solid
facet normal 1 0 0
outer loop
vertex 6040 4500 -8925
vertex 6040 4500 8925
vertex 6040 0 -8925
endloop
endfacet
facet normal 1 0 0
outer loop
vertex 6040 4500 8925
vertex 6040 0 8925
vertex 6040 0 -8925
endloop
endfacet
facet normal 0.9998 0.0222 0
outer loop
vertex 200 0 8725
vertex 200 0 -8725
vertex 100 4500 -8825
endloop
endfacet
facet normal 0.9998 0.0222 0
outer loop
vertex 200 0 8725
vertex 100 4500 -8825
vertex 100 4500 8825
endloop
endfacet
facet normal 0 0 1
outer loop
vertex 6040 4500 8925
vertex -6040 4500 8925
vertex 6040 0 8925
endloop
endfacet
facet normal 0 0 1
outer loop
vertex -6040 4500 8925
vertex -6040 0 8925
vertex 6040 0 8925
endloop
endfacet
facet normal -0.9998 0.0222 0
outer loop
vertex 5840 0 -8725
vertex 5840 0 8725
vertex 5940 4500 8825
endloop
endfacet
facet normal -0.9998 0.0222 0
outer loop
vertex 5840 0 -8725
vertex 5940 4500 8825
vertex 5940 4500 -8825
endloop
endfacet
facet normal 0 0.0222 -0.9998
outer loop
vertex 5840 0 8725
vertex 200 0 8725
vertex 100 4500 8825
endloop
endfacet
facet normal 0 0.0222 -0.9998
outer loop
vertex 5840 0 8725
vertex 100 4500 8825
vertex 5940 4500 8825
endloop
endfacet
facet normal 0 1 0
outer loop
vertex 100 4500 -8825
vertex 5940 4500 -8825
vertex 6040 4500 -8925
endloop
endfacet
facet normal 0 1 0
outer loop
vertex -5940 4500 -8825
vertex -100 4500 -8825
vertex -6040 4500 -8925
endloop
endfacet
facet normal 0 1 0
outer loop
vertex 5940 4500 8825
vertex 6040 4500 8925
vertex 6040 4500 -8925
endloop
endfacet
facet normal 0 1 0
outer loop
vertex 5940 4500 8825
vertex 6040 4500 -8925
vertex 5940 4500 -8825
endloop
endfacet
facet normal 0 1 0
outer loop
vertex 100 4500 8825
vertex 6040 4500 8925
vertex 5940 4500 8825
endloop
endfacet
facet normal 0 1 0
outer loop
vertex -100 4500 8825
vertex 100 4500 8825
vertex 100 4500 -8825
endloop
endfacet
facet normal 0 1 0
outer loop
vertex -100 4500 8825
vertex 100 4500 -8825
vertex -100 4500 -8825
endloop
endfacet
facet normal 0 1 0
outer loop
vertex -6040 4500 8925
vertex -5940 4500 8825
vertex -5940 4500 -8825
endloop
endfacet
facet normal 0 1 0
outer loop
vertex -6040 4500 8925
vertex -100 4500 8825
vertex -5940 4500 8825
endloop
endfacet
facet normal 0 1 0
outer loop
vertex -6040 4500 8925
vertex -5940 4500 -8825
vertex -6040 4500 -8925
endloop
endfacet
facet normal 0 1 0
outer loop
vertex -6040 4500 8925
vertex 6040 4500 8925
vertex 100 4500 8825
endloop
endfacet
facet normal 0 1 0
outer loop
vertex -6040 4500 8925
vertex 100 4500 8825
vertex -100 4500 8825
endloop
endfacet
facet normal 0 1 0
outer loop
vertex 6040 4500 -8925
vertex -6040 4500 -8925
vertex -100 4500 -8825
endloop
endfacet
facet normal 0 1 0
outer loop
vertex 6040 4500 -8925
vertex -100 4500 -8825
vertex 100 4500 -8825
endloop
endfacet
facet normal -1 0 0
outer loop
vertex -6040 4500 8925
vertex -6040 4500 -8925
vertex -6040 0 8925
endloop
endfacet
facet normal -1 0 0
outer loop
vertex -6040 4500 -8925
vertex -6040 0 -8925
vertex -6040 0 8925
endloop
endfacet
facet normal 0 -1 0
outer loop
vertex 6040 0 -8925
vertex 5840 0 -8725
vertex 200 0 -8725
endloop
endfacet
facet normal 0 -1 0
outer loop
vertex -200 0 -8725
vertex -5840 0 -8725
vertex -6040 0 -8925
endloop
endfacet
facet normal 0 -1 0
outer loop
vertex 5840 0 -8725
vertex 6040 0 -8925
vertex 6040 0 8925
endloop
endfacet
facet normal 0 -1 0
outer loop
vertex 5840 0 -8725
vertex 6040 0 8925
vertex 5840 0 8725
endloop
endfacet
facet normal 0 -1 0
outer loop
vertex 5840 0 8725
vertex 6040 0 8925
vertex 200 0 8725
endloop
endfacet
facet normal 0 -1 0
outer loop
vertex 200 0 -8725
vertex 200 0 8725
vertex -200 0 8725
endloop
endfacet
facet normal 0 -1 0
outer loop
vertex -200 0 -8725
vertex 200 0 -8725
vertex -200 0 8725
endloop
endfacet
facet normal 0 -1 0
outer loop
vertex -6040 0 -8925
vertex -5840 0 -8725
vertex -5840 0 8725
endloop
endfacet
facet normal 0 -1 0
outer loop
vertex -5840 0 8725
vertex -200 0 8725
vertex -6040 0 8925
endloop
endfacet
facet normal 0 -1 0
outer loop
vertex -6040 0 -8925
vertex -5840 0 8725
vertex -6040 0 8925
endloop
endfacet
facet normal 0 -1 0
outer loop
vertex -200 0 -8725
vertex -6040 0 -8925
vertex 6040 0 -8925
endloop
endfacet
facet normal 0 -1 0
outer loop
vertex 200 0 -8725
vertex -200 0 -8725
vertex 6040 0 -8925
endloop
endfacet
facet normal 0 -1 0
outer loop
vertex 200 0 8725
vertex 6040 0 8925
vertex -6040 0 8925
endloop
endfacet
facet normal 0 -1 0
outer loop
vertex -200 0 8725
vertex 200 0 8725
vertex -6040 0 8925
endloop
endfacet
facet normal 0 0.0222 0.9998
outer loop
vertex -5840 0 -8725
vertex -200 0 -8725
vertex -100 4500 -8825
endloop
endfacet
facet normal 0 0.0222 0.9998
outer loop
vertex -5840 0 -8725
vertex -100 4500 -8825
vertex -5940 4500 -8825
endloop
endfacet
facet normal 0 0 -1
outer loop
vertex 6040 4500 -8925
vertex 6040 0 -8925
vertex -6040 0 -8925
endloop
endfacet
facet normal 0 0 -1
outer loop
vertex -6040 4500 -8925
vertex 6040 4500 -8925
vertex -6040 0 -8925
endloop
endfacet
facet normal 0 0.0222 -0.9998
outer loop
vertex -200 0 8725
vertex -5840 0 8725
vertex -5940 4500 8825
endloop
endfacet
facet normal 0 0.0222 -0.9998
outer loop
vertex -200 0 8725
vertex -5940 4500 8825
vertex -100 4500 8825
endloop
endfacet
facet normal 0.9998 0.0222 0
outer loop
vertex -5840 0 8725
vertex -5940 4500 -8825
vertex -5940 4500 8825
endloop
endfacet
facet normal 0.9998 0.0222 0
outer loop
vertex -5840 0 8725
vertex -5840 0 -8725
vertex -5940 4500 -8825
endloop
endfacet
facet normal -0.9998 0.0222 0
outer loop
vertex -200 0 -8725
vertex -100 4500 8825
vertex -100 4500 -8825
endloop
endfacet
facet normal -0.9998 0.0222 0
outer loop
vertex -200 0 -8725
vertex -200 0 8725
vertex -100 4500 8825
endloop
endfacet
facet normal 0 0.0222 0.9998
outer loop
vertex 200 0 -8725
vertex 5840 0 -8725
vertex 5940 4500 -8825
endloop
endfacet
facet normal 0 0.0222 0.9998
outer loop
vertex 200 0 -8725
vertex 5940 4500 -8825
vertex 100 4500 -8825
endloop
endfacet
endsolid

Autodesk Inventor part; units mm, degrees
ref_plane "YZ Plane" through (0, 0, 0) normal (1, 0, 0) x (0, 1, 0)
ref_plane "XZ Plane" through (0, 0, 0) normal (0, 1, 0) x (-1, 0, 0)
ref_plane "XY Plane" through (0, 0, 0) normal (0, 0, 1) x (1, 0, 0)
sketch "Эскиз1" plane through (0, 0, 0) normal (0, 1, 0) x (-1, 0, 0)
  line L0 (6040, 8925) -> (-6040, 8925)
  line L1 (-6040, 8925) -> (-6040, -8925)
  line L2 (-6040, -8925) -> (6040, -8925)
  line L3 (6040, -8925) -> (6040, 8925)
  line L4 (-6040, 8925) -> (6040, -8925) construction
  line L5 (-5840, 8725) -> (-5840, -8725)
  line L6 (5840, -8725) -> (5840, 8725)
  line L7 (200, 8725) -> (200, -8725)
  line L8 (-200, 8725) -> (-200, -8725)
  line L9 (5840, 8725) -> (200, 8725)
  line L10 (-200, 8725) -> (-5840, 8725)
  line L11 (-5840, -8725) -> (-200, -8725)
  line L12 (200, -8725) -> (5840, -8725)
  point P0 (0, 0)
  point P1 (0, 0)
  dimension "d0" = 12080
  dimension "d1" = 17850
  dimension "d5" = 200
  dimension "d6" = 400
  dimension "d7" = 200
  dimension "d16" = 200
  dimension "d17" = 200
  dimension "d18" = 200
extrude "Выдавливание4" add sketch "Эскиз1" along normal blind 4500
sketch "Эскиз3" plane through (0, 4500, 0) normal (0, 1, 0) x (1, 0, 0)
  line L0 (6040, -8925) -> (6040, 8925) projected
  line L1 (6040, 8925) -> (-6040, 8925) projected
  line L2 (-6040, 8925) -> (-6040, -8925) projected
  line L3 (-6040, -8925) -> (6040, -8925) projected
  line L4 (200, -8725) -> (200, 8725) projected
  line L5 (200, 8725) -> (5840, 8725) projected
  line L6 (5840, 8725) -> (5840, -8725) projected
  line L7 (5840, -8725) -> (200, -8725) projected
  line L8 (-5840, 8725) -> (-200, 8725) projected
  line L9 (-200, 8725) -> (-200, -8725) projected
  line L10 (-200, -8725) -> (-5840, -8725) projected
  line L11 (-5840, -8725) -> (-5840, 8725) projected
  line L12 (-5940, 8825) -> (-100, 8825)
  line L13 (-100, 8825) -> (-100, -8825)
  line L14 (-100, -8825) -> (-5940, -8825)
  line L15 (-5940, -8825) -> (-5940, 8825)
  line L16 (100, 8825) -> (100, -8825)
  line L17 (100, -8825) -> (5940, -8825)
  line L18 (5940, -8825) -> (5940, 8825)
  line L19 (5940, 8825) -> (100, 8825)
  point P0 (0, 0)
  dimension "d25" = 100
  dimension "d26" = 100
loft "Лофт1" cut profiles "Эскиз3", "Эскиз1" contours L4 L5 L6 L7 | L19 L18 L17 L16 / L10 L8 L11 L5
loft "Лофт2" cut profiles "Эскиз3", "Эскиз1" contours L8 L9 L10 L11 | L12 L13 L14 L15 / L12 L7 L9 L6
sketch "Эскиз4" plane through (5840, 0, -8725) normal (-0.9998, 0.0222, 0) x (0, 0, 1)
  line L0 (17650, 4.4433) -> (-200, 4.4433) projected
  line L1 (-200, 4.4433) -> (-200, 4503.3326) projected
  line L2 (17650, 4503.3326) -> (-200, 4503.3326) projected
  line L3 (17650, 4.4433) -> (17650, 4503.3326) projected
  line L4 (-200, 1504.4433) -> (17650, 1504.4433)
  line L5 (-200, 3004.4433) -> (17650, 3004.4433)
  line L6 (2771.67, 3004.4433) -> (2771.67, 1504.4433)
  line L7 (1285.835, 1504.4433) -> (1285.835, 4.4433)
  line L8 (5743.34, 3004.4433) -> (5743.34, 1504.4433)
  line L9 (8715.01, 3004.4433) -> (8715.01, 1504.4433)
  line L10 (11686.68, 3004.4433) -> (11686.68, 1504.4433)
  line L11 (14658.35, 3004.4433) -> (14658.35, 1504.4433)
  line L12 (4257.505, 1504.4433) -> (4257.505, 4.4433)
  line L13 (7229.175, 1504.4433) -> (7229.175, 4.4433)
  line L14 (10200.845, 1504.4433) -> (10200.845, 4.4433)
  line L15 (13172.515, 1504.4433) -> (13172.515, 4.4433)
  line L16 (16144.185, 1504.4433) -> (16144.185, 4.4433)
  line L17 (1285.835, 3004.4433) -> (1285.835, 4503.3326)
  line L18 (17650, 4503.3326) -> (-200, 4503.3326) projected
  line L19 (4257.505, 3004.4433) -> (4257.505, 4503.3326)
  line L20 (7229.175, 3004.4433) -> (7229.175, 4503.3326)
  line L21 (10200.845, 3004.4433) -> (10200.845, 4503.3326)
  line L22 (13172.515, 3004.4433) -> (13172.515, 4503.3326)
  line L23 (16144.185, 3004.4433) -> (16144.185, 4503.3326)
  point P0 (8725, -129.7457)
  dimension "d38" = 1500
  dimension "d40" = 1500
  dimension "d41" = 2971.67
  dimension "d42" = 1485.835
  dimension "d45" = 2971.67
  dimension "d52" = 2971.67
  dimension "d59" = 2971.67
sketch "Эскиз5" plane through (200, 0, -8725) normal (0, 0.0222, 0.9998) x (1, 0, 0)
  line L0 (5840, 4.4433) -> (-6240, 4.4433) projected
  line L1 (-6240, 4.4433) -> (-6240, 4503.3326) projected
  line L2 (5840, 4503.3326) -> (-6240, 4503.3326) projected
  line L3 (5840, 4.4433) -> (5840, 4503.3326) projected
  line L4 (-6240, 1504.4433) -> (5840, 1504.4433)
  line L5 (-6240, 3004.4433) -> (5840, 3004.4433)
  line L6 (3826.65, 1504.4433) -> (3826.65, 4.4433)
  line L7 (5168.88, 3004.4433) -> (5168.88, 1504.4433)
  line L8 (3826.65, 3004.4433) -> (3826.65, 4503.3326)
  line L9 (1142.21, 1504.4433) -> (1142.21, 4.4433)
  line L10 (-1542.23, 1504.4433) -> (-1542.23, 4.4433)
  line L11 (-4226.67, 1504.4433) -> (-4226.67, 4.4433)
  line L12 (1142.21, 3004.4433) -> (1142.21, 4503.3326)
  line L13 (-1542.23, 3004.4433) -> (-1542.23, 4503.3326)
  line L14 (-4226.67, 3004.4433) -> (-4226.67, 4503.3326)
  line L15 (2484.44, 3004.4433) -> (2484.44, 1504.4433)
  line L16 (-200, 3004.4433) -> (-200, 1504.4433)
  line L17 (-2884.44, 3004.4433) -> (-2884.44, 1504.4433)
  line L18 (-5568.88, 3004.4433) -> (-5568.88, 1504.4433)
  point P0 (-200, -193.841)
  dimension "d64" = 1500
  dimension "d65" = 1500
  dimension "d66" = 2013.35
  dimension "d89" = 671.12
  dimension "d92" = 2684.44
  dimension "d99" = 2684.44
  dimension "d106" = 2684.44
equation "\"d40\" = d38"
equation "\"d42\" = 0.5 * d41"
equation "\"d65\" = d64"
properties part number "GBK overall model"
